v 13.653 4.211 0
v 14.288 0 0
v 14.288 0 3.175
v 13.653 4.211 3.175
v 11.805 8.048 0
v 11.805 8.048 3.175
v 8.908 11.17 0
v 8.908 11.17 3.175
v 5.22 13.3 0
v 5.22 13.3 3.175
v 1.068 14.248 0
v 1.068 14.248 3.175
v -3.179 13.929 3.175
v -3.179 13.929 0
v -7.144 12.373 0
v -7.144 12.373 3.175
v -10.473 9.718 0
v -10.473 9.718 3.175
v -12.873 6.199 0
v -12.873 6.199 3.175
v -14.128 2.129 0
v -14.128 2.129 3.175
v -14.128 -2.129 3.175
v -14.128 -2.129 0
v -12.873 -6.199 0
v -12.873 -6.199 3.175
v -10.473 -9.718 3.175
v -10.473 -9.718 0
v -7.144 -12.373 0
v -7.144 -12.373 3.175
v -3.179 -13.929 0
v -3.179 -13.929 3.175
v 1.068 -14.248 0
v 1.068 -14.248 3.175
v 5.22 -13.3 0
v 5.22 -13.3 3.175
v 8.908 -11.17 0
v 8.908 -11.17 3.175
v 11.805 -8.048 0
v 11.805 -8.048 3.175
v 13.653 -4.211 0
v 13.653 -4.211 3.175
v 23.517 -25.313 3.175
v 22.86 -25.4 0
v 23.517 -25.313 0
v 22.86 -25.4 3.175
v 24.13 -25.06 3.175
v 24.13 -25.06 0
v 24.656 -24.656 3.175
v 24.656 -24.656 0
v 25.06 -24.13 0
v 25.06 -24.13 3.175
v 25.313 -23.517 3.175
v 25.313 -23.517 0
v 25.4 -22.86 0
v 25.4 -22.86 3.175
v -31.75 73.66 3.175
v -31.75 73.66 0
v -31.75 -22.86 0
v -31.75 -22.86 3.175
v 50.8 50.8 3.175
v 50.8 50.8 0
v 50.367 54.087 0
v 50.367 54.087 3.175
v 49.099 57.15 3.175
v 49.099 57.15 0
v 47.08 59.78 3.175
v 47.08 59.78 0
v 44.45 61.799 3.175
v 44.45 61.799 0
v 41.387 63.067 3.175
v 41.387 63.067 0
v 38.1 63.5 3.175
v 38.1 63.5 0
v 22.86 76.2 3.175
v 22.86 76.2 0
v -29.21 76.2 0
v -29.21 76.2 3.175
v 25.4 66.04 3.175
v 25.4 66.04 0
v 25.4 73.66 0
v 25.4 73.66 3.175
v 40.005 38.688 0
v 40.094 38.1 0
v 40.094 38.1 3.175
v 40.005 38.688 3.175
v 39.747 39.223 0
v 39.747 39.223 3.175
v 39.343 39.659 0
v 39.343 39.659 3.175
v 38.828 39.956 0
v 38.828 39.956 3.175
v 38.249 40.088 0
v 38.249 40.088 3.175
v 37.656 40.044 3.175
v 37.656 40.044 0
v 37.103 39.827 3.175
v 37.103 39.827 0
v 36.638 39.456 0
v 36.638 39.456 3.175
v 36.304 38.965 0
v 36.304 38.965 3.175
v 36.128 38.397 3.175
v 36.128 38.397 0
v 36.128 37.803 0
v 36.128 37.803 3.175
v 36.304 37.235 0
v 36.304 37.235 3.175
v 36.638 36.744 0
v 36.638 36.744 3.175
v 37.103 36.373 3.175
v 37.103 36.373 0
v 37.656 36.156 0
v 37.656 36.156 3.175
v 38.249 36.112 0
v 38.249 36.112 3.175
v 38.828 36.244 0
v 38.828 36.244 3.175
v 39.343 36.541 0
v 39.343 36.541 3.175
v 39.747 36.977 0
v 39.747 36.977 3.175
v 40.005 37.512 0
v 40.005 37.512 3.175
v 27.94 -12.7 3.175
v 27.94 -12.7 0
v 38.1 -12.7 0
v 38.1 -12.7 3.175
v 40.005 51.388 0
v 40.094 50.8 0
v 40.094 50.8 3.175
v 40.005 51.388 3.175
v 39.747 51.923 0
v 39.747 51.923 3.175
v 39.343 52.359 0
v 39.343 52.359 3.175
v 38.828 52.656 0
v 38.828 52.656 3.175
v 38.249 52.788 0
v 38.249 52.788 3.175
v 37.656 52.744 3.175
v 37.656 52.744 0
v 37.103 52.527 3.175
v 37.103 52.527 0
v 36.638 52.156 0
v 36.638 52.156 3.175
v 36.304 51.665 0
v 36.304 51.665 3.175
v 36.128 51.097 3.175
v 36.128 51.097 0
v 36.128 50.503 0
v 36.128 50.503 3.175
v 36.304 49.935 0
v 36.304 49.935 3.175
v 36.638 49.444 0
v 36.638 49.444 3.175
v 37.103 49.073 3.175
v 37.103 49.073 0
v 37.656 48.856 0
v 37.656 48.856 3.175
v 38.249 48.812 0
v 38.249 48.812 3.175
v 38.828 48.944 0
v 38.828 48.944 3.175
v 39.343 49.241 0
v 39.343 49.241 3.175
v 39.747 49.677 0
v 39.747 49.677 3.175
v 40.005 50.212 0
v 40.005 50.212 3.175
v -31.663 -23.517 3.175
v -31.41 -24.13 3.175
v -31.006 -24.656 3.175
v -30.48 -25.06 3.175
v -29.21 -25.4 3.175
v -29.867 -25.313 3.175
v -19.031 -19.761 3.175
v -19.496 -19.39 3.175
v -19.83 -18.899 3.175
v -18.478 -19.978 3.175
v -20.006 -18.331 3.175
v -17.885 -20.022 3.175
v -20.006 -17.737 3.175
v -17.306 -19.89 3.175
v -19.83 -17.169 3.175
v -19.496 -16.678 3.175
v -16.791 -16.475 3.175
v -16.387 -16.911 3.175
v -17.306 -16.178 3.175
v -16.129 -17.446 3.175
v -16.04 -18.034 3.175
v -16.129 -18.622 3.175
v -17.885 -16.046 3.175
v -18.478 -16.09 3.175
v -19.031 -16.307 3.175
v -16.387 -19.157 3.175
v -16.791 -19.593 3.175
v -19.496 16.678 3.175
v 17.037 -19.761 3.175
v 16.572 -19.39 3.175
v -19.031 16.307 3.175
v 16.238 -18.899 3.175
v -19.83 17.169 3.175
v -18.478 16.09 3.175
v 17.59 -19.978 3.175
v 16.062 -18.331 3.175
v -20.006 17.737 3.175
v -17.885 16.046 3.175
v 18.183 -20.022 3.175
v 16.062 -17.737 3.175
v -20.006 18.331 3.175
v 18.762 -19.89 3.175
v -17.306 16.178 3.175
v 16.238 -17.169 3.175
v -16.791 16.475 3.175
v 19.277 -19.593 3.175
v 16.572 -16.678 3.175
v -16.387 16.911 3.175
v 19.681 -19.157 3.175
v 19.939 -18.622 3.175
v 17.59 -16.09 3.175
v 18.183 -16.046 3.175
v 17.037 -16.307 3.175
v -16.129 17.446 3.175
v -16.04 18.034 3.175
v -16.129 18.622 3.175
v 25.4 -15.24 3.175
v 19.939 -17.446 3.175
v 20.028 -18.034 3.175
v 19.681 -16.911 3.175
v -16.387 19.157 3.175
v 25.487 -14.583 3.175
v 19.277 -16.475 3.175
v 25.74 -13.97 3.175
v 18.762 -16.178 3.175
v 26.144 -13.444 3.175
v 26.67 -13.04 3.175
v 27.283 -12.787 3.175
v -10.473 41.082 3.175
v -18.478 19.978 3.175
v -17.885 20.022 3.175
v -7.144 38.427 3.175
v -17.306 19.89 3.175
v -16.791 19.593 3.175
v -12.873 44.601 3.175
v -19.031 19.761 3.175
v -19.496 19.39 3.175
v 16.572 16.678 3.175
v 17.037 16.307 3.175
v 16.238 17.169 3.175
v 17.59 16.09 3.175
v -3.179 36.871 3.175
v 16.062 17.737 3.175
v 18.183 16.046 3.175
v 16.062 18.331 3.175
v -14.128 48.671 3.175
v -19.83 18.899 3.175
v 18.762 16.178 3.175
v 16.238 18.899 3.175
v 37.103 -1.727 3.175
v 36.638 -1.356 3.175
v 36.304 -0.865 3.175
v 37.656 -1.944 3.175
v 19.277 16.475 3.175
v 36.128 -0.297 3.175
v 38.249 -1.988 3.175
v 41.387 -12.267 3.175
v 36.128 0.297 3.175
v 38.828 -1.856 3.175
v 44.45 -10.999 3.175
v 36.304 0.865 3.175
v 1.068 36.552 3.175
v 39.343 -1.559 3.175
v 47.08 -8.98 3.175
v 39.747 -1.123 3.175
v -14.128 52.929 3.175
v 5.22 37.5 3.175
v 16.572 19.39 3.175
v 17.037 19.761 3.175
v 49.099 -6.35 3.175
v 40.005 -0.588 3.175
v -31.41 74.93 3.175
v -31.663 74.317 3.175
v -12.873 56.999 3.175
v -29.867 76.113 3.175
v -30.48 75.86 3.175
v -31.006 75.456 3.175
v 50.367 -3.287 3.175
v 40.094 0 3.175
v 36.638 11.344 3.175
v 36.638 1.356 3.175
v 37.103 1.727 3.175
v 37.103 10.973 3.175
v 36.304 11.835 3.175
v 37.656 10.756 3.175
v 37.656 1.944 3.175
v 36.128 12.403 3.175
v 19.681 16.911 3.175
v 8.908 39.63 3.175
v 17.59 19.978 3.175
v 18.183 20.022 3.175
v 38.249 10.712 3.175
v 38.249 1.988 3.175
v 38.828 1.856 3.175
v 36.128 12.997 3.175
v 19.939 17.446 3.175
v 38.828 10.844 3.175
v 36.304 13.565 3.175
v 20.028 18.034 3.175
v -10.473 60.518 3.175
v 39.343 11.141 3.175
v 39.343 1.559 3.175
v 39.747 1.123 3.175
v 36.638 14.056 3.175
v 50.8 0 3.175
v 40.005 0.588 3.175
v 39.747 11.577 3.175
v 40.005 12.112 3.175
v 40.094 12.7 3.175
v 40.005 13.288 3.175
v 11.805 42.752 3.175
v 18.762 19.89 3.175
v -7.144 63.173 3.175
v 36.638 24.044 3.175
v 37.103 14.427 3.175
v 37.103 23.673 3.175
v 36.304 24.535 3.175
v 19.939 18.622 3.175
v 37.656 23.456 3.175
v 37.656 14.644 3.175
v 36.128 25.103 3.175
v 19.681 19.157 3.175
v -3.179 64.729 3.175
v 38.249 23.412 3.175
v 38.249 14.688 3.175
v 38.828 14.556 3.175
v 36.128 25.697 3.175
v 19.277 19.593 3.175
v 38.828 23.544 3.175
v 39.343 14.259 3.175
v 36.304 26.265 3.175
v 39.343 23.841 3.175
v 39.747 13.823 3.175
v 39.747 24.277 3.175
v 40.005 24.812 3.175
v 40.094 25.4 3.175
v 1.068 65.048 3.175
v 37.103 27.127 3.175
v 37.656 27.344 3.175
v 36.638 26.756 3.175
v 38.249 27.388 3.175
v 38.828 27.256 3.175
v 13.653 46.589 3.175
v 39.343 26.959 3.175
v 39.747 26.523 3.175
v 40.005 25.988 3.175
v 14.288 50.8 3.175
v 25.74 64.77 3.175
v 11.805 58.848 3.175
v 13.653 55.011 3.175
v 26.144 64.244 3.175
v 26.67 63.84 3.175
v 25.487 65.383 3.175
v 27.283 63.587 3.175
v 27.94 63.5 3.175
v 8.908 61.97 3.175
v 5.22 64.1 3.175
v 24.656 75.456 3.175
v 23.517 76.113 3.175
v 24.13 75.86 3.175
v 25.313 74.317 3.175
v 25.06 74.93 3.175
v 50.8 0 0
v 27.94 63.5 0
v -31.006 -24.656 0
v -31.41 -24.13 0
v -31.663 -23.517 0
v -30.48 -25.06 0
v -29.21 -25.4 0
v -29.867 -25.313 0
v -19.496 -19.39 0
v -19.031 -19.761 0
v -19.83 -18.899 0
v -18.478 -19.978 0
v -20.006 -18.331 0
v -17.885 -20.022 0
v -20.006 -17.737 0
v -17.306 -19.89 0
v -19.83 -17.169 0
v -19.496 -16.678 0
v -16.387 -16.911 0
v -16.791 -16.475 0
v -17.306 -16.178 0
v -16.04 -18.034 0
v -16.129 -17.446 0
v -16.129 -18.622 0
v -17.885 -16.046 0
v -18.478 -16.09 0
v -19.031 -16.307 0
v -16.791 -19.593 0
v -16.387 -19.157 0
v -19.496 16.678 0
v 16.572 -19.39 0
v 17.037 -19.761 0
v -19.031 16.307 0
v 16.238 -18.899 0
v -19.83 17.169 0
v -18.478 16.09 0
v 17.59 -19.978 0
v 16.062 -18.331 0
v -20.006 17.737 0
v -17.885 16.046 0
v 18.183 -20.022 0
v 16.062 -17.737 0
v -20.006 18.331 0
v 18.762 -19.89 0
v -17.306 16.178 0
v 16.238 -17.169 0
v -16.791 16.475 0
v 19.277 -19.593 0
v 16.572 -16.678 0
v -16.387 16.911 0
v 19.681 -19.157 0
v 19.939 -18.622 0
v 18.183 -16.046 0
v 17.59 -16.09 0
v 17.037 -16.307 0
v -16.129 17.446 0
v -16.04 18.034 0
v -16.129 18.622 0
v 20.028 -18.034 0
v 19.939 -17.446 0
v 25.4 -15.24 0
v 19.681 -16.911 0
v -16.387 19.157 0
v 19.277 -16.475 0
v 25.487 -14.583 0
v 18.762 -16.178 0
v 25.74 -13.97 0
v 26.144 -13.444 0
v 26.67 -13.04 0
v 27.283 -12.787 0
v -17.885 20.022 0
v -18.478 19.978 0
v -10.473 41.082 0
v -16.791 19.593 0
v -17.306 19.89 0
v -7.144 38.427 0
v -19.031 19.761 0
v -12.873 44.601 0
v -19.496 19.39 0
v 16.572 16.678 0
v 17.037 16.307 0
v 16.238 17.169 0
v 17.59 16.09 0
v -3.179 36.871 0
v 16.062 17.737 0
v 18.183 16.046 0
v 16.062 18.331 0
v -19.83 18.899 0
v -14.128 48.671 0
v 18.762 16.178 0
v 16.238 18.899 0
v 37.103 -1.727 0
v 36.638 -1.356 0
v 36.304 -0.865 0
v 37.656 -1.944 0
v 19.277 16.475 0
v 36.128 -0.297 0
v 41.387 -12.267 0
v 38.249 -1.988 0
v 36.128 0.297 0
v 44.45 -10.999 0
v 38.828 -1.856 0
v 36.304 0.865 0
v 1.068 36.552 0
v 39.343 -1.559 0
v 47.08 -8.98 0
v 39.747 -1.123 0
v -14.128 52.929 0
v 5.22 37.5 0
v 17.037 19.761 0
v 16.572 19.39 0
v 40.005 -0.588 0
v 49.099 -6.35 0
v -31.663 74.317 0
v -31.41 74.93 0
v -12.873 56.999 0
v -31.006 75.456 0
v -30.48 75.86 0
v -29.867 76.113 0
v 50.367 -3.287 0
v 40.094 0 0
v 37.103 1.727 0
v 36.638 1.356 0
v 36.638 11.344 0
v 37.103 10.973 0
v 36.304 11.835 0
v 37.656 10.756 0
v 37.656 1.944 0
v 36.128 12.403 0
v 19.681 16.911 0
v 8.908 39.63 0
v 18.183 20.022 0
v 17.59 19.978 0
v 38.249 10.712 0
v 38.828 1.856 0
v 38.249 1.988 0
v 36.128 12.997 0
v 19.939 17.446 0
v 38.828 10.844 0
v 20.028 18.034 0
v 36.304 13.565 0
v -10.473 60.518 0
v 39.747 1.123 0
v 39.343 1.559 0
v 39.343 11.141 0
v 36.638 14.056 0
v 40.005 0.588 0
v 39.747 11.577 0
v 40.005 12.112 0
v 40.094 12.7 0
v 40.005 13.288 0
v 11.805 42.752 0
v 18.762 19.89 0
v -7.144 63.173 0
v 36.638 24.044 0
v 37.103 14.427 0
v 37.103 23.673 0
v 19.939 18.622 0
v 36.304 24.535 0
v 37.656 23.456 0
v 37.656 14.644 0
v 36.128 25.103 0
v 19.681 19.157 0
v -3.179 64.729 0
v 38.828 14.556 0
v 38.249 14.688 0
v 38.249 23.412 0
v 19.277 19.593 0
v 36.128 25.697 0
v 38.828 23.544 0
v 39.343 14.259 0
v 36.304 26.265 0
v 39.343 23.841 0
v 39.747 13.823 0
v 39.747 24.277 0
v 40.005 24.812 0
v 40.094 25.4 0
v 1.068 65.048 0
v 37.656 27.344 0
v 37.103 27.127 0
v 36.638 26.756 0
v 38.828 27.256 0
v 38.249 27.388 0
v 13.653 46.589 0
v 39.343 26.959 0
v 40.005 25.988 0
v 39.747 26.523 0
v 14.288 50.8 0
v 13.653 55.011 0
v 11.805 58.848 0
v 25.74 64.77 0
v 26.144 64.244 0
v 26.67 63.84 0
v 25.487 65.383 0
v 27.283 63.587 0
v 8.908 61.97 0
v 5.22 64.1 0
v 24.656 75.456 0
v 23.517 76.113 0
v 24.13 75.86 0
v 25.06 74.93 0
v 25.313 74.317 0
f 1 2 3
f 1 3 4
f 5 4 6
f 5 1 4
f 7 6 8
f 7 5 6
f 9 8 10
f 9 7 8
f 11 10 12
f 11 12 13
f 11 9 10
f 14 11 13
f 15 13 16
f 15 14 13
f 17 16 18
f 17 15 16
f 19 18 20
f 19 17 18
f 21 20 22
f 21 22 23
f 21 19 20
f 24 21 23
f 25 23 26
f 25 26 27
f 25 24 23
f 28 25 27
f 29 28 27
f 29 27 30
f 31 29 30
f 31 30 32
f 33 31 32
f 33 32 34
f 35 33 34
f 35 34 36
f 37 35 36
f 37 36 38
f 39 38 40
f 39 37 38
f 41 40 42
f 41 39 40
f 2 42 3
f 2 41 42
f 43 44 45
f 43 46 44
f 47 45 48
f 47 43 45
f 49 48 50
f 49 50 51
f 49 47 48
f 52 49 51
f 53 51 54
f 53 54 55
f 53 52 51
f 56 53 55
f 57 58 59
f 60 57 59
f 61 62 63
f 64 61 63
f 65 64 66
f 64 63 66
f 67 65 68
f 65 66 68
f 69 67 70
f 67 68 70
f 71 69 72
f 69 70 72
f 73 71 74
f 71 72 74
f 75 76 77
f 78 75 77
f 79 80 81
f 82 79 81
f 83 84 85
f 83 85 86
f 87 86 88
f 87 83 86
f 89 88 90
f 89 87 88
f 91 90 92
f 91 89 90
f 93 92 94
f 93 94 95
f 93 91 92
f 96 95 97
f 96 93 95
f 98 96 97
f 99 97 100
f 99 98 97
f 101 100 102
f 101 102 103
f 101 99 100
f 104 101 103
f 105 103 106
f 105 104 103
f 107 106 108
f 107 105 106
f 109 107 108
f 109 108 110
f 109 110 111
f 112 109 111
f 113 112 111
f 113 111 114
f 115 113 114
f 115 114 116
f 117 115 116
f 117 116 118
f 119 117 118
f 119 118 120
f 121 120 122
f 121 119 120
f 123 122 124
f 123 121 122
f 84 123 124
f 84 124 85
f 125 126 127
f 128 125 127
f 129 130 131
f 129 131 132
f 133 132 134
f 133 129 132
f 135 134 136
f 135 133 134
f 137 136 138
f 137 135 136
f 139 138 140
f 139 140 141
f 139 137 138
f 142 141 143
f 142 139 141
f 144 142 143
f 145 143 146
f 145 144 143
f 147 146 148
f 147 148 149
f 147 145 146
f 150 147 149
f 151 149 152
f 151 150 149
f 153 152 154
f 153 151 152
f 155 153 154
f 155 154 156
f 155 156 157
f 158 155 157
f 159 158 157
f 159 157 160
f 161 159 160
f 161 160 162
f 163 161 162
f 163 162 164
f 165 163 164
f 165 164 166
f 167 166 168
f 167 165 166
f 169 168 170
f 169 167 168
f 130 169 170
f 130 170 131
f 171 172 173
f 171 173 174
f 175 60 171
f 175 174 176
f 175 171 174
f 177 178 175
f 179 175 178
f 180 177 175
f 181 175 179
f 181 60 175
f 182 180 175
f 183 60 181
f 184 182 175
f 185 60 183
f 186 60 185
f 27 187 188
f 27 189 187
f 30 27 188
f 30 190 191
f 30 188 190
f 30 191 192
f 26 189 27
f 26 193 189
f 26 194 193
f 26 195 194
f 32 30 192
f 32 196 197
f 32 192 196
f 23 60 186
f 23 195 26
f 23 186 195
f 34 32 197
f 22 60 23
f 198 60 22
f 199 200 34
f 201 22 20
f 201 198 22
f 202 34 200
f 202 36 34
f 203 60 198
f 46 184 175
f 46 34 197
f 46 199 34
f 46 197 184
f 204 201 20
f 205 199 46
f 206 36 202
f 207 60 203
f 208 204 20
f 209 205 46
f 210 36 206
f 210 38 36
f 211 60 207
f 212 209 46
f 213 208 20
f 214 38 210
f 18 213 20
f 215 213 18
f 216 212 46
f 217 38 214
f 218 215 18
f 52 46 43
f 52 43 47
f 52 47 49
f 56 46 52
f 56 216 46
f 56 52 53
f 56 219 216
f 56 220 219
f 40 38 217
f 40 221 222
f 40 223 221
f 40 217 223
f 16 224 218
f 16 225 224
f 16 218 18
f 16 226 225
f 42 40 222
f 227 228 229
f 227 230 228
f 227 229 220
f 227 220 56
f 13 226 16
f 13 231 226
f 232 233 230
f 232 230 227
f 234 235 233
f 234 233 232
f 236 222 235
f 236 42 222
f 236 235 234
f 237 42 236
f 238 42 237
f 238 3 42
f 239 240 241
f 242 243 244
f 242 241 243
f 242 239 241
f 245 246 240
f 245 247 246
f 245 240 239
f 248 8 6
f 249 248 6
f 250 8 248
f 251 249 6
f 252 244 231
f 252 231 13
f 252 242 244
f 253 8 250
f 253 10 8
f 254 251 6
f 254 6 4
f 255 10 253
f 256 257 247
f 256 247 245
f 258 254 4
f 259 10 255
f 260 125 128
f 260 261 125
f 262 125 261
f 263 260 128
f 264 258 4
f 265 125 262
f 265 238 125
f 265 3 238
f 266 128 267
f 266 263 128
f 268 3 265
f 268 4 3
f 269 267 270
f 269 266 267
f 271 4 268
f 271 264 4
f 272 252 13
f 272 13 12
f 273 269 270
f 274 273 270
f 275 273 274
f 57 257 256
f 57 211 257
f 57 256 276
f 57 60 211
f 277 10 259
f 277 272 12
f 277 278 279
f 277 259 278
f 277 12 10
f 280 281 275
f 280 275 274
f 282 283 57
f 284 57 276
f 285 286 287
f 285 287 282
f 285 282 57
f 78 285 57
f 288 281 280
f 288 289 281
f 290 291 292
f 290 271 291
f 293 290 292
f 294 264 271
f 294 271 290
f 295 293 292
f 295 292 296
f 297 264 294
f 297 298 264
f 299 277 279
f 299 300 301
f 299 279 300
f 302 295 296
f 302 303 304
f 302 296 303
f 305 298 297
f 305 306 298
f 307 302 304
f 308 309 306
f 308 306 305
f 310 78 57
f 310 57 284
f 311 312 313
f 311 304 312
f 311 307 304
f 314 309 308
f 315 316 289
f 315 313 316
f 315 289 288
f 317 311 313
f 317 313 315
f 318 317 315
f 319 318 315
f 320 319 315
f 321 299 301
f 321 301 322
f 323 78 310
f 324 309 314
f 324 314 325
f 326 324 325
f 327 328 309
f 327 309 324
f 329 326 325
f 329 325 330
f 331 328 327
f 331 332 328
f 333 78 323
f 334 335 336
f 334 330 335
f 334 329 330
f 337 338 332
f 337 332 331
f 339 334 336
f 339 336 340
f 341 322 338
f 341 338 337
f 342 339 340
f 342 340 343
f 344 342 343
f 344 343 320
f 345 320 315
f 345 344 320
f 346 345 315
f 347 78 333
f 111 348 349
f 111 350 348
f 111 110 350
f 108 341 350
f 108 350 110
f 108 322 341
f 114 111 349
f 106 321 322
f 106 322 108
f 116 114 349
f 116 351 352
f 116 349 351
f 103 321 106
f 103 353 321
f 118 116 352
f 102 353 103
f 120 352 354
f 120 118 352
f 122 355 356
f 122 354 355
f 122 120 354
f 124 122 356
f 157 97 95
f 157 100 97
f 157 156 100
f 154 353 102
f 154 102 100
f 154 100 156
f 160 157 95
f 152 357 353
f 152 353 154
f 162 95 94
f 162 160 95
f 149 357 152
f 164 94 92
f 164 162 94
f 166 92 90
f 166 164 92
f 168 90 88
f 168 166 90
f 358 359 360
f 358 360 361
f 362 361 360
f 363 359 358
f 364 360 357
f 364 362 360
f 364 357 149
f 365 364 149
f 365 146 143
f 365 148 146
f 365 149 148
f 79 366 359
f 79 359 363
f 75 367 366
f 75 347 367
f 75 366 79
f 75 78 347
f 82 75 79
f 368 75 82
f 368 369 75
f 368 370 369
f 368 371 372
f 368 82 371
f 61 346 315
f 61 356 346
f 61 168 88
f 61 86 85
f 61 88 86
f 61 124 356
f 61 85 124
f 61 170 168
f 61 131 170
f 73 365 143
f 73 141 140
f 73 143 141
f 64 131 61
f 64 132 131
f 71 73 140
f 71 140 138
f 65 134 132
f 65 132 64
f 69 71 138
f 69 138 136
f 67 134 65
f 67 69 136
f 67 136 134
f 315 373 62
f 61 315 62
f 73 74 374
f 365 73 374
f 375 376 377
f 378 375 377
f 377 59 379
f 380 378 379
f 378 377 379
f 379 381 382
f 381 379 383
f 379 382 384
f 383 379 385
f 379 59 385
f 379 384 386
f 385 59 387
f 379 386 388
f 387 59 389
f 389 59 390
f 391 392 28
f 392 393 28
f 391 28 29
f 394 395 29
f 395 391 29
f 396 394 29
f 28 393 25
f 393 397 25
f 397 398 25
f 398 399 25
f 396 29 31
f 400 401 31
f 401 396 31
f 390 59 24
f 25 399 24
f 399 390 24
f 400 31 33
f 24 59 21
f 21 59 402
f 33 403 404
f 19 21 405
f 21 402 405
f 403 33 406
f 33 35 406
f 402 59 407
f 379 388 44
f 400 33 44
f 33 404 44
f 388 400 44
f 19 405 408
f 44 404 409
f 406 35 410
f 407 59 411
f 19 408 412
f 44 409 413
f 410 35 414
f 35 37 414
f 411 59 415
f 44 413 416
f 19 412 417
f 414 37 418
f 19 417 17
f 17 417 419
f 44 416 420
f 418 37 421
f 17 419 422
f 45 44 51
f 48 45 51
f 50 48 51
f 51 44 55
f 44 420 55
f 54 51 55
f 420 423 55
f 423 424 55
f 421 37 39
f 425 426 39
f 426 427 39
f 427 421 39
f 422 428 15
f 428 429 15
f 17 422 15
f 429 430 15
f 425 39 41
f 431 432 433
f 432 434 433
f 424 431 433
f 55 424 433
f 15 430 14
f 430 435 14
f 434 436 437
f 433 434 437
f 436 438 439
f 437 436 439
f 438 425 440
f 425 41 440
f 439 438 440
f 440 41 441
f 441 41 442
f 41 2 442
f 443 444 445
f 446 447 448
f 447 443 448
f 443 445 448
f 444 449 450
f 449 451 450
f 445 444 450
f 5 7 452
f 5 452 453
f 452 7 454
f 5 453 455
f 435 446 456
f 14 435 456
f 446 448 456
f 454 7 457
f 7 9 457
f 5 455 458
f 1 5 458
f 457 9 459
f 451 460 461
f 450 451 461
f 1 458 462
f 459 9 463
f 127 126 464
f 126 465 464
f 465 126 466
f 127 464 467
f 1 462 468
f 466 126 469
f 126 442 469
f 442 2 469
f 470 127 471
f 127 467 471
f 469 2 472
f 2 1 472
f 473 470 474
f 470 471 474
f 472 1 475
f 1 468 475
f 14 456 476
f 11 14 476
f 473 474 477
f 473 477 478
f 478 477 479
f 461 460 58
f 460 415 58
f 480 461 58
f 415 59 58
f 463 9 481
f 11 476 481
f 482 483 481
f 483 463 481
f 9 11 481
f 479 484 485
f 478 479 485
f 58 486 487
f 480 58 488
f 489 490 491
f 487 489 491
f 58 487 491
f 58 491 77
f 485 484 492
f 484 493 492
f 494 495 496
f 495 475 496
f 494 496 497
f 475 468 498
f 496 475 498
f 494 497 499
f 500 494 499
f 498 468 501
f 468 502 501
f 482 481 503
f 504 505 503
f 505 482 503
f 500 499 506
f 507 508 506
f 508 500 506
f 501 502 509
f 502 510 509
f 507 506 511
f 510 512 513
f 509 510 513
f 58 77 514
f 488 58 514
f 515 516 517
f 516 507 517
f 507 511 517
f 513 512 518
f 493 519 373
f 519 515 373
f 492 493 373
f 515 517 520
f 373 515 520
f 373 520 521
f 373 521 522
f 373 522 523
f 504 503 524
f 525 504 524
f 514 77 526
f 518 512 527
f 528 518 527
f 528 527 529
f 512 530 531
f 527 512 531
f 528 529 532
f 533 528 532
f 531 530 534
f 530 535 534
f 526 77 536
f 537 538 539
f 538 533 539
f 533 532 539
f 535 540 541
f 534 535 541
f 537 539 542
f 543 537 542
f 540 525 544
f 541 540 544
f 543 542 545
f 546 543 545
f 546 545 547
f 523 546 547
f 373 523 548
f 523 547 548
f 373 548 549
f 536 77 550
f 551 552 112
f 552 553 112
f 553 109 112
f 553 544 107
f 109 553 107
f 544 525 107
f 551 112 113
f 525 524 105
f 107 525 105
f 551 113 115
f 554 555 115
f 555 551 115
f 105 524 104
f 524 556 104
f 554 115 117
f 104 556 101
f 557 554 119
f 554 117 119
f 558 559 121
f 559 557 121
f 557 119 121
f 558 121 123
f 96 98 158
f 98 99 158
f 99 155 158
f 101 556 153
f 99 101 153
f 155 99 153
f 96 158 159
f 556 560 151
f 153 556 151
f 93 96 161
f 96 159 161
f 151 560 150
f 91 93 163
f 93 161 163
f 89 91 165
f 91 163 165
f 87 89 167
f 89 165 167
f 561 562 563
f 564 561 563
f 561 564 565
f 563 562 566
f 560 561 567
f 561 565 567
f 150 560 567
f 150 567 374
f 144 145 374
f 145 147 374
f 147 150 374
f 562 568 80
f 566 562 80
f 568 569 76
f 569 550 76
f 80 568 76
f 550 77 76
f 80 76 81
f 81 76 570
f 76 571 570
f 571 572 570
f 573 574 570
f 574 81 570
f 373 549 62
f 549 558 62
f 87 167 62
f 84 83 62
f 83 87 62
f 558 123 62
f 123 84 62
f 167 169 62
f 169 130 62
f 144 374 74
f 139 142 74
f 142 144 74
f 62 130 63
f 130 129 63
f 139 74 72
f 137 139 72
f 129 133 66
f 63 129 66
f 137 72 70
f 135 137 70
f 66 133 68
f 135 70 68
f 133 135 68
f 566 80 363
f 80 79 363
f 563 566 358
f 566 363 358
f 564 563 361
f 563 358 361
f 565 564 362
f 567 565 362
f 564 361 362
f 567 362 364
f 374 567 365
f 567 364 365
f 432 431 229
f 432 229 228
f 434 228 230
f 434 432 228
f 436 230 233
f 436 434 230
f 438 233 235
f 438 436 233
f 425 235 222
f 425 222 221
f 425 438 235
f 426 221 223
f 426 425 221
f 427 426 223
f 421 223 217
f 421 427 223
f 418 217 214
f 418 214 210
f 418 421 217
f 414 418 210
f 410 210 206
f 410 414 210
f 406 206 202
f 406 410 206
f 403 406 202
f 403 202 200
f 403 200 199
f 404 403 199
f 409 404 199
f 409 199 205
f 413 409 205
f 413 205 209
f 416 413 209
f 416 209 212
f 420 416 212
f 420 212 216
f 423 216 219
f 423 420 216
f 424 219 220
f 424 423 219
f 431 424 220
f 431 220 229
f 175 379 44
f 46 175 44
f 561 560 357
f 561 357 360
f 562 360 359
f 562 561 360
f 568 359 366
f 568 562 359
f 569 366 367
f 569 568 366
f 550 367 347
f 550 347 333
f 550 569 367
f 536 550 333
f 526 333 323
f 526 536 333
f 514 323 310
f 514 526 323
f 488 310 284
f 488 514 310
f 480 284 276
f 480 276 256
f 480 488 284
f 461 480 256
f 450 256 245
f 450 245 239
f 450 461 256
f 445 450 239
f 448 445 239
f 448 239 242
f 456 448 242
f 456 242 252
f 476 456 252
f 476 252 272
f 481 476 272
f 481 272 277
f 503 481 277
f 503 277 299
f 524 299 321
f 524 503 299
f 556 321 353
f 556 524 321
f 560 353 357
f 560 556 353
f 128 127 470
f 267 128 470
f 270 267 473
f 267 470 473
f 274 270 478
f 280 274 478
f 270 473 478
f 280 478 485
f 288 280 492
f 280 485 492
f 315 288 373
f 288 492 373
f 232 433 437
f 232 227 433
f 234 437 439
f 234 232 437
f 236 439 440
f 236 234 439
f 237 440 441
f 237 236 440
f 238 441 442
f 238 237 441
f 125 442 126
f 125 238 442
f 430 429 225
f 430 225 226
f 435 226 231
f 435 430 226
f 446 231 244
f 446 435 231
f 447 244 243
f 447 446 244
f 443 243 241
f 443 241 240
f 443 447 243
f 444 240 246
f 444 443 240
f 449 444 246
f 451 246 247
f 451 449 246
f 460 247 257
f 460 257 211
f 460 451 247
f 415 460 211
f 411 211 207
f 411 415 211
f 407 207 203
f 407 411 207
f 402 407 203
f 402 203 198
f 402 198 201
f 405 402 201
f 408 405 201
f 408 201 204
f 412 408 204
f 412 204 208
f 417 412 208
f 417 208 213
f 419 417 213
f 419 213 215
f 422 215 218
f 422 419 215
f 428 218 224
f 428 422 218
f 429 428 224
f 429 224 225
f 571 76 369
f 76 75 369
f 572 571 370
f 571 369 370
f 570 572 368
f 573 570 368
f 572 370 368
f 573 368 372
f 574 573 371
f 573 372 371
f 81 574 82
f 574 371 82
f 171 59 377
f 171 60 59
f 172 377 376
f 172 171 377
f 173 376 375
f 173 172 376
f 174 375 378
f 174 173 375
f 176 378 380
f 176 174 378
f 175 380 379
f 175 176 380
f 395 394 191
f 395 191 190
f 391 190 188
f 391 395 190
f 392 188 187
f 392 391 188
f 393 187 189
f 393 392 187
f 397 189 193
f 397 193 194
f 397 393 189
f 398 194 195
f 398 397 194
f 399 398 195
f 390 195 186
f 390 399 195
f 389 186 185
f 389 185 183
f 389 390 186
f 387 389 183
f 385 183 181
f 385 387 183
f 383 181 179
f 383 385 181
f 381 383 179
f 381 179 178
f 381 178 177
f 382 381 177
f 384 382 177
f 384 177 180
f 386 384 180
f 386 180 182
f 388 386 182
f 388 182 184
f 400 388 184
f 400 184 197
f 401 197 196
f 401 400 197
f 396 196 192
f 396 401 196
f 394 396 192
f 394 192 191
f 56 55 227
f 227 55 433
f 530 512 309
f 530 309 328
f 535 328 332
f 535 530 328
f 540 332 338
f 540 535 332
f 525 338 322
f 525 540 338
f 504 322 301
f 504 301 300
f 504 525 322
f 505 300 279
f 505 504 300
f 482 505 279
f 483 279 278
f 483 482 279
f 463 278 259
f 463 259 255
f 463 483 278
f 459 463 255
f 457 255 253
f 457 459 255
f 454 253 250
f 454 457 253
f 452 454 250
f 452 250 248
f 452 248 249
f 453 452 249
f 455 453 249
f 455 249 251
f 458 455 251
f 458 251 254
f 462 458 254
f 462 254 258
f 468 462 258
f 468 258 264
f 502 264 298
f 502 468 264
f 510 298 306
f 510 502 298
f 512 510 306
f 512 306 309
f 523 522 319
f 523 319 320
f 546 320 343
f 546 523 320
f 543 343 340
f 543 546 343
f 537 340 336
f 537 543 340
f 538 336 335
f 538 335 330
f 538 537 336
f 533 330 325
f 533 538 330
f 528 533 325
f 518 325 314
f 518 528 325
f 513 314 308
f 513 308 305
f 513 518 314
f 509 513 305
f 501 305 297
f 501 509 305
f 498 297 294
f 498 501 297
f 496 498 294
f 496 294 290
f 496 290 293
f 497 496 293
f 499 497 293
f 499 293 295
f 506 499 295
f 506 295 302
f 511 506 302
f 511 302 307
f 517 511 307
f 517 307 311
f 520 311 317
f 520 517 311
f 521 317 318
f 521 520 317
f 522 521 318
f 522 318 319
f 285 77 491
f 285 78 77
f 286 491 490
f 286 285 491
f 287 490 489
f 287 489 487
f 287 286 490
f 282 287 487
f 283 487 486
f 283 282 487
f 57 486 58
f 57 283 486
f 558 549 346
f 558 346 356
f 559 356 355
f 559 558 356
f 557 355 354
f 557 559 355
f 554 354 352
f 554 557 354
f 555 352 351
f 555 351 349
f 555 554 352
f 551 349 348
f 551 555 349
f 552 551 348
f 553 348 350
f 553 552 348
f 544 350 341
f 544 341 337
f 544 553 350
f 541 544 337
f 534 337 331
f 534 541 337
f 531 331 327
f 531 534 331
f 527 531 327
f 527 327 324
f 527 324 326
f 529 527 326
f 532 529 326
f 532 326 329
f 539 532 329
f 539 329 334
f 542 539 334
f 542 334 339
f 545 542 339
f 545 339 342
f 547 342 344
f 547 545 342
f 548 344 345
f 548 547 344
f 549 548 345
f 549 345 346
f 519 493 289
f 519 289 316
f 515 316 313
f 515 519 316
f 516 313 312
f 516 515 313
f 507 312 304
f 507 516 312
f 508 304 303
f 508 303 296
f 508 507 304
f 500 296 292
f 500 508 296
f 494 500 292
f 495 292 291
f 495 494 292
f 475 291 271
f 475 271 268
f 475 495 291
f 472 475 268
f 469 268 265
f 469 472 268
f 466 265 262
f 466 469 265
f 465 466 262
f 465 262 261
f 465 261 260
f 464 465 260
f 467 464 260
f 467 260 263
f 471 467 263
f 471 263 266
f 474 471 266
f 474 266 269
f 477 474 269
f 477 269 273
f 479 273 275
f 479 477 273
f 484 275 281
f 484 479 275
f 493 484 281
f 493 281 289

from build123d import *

# Parameters (mm, degrees)
SKETCH1_R           = 1.9939
SKETCH1_R_2         = 14.2875
BOSS_EXTRUDE1_DEPTH = 3.175
FILLET1_R           = 2.54


with BuildPart() as part:
    # Sketch1 → Boss-Extrude1 (new body)
    with BuildSketch(Plane.XY):
        with BuildLine():
            Line((25.4, 76.2), (-31.75, 76.2))
            Line((-31.75, 76.2), (-31.75, -25.4))
            Line((-31.75, -25.4), (25.4, -25.4))
            Line((25.4, -25.4), (25.4, -12.7))
            Line((25.4, -12.7), (38.1, -12.7))
            ThreePointArc((38.1, -12.7), (47.080256121, -8.980256121), (50.8, 0))
            Line((50.8, 0), (50.8, 50.8))
            ThreePointArc((50.8, 50.8), (47.080256121, 59.780256121), (38.1, 63.5))
            Line((38.1, 63.5), (25.4, 63.5))
            Line((25.4, 63.5), (25.4, 76.2))
        make_face()
        with Locations((-18.034, -18.034)):
            Circle(SKETCH1_R, mode=Mode.SUBTRACT)
        with Locations((-18.034, 18.034)):
            Circle(SKETCH1_R, mode=Mode.SUBTRACT)
        Circle(SKETCH1_R_2, mode=Mode.SUBTRACT)
        with Locations((18.034, -18.034)):
            Circle(SKETCH1_R, mode=Mode.SUBTRACT)
        with Locations((18.034, 18.034)):
            Circle(SKETCH1_R, mode=Mode.SUBTRACT)
        with Locations((38.1, 0)):
            Circle(SKETCH1_R, mode=Mode.SUBTRACT)
        with Locations((38.1, 12.7)):
            Circle(SKETCH1_R, mode=Mode.SUBTRACT)
        with Locations((0, 50.8)):
            Circle(SKETCH1_R_2, mode=Mode.SUBTRACT)
        with Locations((38.1, 25.4)):
            Circle(SKETCH1_R, mode=Mode.SUBTRACT)
        with Locations((38.1, 38.1)):
            Circle(SKETCH1_R, mode=Mode.SUBTRACT)
        with Locations((38.1, 50.8)):
            Circle(SKETCH1_R, mode=Mode.SUBTRACT)
    extrude(amount=BOSS_EXTRUDE1_DEPTH)

    # Fillet1
    fillet1_edges = [part.edges().sort_by_distance(p)[0] for p in [
        (25.4, -12.7, 1.5875),
        (25.4, -25.4, 1.5875),
        (-31.75, -25.4, 1.5875),
        (-31.75, 76.2, 1.5875),
        (25.4, 76.2, 1.5875),
        (25.4, 63.5, 1.5875),
    ]]
    fillet(fillet1_edges, radius=FILLET1_R)


solid = part.part
